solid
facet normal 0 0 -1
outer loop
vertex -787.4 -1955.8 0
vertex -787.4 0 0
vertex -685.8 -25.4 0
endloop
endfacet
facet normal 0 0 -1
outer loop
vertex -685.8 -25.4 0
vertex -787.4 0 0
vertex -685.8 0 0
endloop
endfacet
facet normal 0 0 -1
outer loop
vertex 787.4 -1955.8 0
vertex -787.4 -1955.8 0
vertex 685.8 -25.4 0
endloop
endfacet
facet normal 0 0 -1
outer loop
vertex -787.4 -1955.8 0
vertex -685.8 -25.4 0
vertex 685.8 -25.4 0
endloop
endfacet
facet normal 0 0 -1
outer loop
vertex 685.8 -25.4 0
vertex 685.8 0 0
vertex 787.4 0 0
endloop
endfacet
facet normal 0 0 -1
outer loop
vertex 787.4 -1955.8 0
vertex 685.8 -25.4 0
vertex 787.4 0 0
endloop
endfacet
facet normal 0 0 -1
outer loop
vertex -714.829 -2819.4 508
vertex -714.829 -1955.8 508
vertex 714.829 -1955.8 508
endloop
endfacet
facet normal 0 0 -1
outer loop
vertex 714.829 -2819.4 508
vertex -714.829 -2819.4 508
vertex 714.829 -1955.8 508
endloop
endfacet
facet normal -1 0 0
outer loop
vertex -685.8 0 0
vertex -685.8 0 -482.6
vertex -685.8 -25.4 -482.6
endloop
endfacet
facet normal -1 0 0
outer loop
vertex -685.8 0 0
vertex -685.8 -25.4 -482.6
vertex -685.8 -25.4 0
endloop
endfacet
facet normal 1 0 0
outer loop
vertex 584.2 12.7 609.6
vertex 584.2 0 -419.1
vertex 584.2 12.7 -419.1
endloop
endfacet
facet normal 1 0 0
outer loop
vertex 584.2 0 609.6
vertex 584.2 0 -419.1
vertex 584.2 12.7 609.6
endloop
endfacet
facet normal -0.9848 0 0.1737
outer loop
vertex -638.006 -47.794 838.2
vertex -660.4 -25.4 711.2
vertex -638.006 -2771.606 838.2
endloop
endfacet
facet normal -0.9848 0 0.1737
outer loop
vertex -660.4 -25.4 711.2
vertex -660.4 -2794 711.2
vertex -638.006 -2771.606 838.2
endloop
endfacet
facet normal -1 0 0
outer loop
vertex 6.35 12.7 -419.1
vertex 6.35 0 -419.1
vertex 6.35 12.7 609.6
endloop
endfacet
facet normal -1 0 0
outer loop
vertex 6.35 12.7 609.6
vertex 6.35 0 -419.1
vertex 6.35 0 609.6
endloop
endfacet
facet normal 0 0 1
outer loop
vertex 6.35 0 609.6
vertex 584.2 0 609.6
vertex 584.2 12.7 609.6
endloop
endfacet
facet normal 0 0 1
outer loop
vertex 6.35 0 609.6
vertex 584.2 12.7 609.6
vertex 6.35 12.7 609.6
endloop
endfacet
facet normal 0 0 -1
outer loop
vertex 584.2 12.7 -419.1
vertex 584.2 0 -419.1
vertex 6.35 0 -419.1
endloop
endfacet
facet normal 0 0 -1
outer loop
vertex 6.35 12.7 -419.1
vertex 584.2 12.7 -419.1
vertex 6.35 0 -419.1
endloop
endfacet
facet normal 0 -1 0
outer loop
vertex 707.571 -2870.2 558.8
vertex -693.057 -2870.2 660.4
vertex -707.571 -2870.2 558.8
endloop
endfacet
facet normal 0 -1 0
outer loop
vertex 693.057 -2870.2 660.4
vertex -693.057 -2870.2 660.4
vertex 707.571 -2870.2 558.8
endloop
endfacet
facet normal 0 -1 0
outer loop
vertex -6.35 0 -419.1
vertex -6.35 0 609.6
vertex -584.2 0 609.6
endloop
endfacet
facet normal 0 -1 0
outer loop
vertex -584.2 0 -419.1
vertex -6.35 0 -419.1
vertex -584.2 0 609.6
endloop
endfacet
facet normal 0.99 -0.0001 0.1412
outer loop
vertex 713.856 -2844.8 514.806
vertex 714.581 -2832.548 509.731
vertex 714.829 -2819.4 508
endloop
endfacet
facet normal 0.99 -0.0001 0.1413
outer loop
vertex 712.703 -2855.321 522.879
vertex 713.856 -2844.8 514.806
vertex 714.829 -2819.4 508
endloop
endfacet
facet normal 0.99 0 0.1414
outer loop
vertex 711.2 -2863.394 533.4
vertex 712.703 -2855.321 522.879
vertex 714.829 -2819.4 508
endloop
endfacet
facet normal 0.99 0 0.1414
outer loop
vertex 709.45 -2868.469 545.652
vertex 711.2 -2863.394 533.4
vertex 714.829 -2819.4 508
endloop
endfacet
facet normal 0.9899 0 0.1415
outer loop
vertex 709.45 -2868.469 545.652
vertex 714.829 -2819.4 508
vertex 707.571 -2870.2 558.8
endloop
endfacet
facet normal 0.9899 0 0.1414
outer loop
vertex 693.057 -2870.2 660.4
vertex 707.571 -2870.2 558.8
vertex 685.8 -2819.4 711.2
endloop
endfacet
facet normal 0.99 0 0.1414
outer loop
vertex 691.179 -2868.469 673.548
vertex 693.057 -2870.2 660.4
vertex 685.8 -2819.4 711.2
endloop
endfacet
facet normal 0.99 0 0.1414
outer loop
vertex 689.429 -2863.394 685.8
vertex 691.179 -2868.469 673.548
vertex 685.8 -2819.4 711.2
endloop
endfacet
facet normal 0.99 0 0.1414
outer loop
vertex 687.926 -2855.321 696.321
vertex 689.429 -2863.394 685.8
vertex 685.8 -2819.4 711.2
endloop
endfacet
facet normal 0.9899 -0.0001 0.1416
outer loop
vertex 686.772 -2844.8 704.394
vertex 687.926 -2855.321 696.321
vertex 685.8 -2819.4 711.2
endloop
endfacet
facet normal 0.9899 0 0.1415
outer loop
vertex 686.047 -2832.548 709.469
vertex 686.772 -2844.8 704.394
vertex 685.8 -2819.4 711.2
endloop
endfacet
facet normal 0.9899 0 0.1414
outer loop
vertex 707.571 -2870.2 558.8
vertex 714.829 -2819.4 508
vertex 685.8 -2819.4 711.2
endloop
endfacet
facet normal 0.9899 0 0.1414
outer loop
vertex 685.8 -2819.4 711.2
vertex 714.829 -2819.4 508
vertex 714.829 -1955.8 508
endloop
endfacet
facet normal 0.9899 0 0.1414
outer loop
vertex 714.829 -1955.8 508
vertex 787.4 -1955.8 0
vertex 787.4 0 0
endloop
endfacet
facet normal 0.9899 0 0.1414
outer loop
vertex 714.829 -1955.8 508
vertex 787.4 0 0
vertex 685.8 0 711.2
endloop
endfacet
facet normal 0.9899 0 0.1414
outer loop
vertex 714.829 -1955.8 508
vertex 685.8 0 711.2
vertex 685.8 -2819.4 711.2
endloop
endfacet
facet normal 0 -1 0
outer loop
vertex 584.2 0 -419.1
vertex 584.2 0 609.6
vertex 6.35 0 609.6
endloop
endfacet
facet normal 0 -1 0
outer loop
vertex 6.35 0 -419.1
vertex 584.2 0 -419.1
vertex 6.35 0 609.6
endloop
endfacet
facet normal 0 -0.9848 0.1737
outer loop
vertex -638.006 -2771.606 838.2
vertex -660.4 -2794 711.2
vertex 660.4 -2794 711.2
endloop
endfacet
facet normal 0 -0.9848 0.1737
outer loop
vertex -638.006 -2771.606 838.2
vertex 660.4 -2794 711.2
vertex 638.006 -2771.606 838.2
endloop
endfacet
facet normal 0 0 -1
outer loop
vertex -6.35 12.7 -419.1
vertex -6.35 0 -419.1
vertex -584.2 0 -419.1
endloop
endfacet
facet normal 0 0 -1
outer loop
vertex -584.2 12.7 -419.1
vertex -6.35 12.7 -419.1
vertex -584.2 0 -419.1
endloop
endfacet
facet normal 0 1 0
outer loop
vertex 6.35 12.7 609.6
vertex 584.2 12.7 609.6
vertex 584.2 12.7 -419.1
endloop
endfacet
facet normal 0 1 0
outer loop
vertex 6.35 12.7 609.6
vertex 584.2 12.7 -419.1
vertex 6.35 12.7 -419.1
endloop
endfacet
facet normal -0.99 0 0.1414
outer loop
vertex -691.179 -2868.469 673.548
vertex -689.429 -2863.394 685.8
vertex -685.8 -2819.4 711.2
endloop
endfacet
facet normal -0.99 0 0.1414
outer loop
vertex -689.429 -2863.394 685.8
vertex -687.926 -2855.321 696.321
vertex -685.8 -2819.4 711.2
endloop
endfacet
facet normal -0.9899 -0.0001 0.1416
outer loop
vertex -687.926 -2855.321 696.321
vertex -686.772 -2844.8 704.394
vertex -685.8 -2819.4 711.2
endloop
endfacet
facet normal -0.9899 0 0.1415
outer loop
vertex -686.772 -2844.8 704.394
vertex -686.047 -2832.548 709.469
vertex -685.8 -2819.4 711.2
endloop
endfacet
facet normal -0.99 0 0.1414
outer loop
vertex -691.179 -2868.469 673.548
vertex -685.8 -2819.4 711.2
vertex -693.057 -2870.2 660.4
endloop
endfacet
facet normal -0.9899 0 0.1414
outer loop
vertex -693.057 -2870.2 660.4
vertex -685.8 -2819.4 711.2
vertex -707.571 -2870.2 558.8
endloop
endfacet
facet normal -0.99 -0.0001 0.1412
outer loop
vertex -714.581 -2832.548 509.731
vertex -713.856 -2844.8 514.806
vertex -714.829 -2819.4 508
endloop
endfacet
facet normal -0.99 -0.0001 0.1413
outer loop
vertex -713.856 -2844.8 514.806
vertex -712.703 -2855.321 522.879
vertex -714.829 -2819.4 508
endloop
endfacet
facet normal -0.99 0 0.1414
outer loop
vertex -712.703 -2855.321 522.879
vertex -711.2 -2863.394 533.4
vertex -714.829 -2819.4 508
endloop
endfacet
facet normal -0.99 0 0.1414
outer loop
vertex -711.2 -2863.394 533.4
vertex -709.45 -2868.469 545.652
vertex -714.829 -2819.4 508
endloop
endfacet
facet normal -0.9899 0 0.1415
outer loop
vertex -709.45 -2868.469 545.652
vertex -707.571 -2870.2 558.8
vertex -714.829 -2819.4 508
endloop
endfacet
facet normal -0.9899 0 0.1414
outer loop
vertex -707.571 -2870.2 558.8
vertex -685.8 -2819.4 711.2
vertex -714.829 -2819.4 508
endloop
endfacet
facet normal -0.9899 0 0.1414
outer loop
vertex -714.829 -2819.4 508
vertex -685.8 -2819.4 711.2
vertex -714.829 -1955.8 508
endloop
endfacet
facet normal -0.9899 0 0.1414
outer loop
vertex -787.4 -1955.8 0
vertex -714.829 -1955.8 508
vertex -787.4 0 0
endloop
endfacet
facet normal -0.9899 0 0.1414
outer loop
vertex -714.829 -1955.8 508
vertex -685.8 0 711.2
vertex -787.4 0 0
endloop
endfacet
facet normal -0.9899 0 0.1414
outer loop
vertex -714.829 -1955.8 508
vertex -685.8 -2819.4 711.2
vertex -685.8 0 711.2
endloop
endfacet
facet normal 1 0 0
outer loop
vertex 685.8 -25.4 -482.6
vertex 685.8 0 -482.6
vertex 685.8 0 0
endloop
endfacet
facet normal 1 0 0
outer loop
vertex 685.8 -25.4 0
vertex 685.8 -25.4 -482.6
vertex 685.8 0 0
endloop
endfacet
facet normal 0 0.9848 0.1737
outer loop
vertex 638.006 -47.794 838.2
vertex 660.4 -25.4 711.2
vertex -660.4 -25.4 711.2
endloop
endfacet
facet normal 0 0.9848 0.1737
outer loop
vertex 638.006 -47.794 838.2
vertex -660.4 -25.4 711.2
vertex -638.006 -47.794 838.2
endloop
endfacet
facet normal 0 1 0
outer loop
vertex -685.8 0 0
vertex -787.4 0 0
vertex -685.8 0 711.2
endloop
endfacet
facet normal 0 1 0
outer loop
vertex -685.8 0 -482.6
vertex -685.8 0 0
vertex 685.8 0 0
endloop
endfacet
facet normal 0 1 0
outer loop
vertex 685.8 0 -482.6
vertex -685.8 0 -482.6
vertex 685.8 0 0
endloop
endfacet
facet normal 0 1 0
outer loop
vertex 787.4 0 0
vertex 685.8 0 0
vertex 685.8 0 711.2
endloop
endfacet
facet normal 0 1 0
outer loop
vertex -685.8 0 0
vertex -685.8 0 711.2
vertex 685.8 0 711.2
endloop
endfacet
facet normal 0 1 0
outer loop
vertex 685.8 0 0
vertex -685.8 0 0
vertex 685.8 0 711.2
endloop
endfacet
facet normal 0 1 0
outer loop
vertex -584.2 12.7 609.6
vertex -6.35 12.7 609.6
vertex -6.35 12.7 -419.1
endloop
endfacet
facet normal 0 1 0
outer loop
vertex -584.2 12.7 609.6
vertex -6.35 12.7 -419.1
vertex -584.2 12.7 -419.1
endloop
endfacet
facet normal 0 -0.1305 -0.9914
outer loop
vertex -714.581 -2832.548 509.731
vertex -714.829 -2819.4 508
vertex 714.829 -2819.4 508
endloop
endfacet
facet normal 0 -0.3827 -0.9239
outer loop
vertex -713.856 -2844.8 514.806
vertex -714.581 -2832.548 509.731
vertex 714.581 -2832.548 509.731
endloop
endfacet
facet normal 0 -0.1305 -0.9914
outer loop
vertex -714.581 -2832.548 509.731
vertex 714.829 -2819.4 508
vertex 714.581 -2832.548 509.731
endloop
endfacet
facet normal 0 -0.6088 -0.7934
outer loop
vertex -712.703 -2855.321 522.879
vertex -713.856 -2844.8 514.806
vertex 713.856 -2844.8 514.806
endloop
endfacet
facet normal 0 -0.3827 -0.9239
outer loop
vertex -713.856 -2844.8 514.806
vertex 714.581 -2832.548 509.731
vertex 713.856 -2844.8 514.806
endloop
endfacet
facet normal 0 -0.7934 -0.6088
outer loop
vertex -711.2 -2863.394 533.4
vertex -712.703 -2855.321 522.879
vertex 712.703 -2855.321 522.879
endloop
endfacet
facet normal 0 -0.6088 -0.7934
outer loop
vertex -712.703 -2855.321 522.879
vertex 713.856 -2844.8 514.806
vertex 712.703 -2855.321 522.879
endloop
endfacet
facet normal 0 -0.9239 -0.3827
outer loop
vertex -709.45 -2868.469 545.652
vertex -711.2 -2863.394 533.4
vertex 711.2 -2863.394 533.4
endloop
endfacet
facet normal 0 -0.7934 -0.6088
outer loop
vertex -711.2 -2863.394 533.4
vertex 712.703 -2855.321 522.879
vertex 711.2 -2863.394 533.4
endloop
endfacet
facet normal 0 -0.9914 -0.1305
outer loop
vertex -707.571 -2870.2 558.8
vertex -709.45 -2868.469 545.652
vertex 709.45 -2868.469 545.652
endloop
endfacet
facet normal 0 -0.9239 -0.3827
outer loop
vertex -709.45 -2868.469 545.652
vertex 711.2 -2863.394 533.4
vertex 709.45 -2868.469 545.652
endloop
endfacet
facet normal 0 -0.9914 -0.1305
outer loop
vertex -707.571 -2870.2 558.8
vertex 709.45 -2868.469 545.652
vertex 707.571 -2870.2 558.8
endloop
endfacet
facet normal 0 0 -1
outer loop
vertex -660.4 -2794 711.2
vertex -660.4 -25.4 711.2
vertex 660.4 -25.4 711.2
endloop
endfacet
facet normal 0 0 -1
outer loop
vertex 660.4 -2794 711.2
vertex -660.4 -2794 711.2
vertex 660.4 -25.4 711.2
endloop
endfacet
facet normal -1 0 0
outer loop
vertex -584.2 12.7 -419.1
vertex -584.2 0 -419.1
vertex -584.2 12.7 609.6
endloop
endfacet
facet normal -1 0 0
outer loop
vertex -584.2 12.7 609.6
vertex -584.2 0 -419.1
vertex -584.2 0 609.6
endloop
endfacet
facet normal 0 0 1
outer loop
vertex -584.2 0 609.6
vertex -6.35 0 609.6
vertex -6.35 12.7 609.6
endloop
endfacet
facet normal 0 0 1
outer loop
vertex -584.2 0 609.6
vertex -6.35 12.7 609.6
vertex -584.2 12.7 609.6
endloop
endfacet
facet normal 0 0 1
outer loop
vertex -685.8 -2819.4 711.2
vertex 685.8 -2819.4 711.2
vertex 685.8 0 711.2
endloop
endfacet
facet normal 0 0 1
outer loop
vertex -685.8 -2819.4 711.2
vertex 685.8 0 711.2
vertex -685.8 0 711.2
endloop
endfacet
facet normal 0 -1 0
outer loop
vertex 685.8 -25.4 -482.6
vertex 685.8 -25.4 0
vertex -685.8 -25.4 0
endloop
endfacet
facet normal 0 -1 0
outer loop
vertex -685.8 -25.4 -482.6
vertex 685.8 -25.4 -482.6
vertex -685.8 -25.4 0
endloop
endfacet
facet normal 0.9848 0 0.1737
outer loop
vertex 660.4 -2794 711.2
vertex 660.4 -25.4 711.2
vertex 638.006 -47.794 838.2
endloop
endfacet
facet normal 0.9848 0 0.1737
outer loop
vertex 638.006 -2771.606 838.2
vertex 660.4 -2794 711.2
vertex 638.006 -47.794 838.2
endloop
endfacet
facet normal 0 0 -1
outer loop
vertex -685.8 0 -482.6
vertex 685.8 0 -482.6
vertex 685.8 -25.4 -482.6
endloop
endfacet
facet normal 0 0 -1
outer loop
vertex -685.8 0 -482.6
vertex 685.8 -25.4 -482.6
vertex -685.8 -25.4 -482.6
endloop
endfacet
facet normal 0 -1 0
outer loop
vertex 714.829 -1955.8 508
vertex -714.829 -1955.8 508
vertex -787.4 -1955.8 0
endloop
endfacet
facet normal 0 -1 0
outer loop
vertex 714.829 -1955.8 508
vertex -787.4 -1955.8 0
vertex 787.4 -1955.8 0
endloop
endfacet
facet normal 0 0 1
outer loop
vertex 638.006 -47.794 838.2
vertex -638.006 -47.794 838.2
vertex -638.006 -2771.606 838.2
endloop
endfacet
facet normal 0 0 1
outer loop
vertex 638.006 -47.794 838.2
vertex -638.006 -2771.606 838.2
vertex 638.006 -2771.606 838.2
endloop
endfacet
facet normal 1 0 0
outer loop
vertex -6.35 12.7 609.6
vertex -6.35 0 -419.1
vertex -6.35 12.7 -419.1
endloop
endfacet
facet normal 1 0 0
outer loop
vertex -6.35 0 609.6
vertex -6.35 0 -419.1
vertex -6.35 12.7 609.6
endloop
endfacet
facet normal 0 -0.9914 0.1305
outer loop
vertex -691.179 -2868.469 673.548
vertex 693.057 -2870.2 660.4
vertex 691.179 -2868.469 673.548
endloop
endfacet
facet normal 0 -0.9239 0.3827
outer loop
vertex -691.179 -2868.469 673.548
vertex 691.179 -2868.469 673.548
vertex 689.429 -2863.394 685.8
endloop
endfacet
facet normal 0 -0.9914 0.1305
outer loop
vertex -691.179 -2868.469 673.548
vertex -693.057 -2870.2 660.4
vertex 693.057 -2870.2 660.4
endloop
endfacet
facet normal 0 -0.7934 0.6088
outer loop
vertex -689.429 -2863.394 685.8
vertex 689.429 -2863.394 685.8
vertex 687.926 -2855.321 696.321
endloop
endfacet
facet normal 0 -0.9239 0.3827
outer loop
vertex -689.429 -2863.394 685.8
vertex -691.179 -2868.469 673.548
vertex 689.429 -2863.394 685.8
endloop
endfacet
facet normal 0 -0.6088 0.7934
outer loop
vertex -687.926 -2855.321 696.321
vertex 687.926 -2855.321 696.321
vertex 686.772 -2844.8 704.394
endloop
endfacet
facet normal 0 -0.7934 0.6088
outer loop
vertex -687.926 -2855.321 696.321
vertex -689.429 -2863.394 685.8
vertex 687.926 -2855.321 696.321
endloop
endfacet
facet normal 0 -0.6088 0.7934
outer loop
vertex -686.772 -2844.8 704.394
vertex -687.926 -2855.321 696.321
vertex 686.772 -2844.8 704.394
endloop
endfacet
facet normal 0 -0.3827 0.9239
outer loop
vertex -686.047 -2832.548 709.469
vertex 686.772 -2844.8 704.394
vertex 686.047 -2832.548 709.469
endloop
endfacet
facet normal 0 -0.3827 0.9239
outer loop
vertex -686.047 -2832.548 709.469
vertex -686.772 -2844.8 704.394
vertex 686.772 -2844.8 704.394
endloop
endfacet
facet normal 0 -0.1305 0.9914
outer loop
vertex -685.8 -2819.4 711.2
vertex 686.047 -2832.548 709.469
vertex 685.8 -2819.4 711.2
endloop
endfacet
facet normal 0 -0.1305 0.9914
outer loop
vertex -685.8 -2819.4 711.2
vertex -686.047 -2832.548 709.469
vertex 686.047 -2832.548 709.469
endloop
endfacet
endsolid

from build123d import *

# Parameters (mm, degrees)
F1_DEPTH  = 1955.8
F3_DEPTH  = 914.4
F4_R      = 50.8
F5_W      = 1320.8
F5_H      = 2768.6
F6_DEPTH  = 127
F6_TAPER  = 10
F7_W      = 1371.6
F7_H      = 482.6
F8_DEPTH  = 25.4
F9_W      = 577.85
F9_H      = 1028.7
F10_DEPTH = 12.7


with BuildPart() as f1:
    # F0 (on Front) → F1 (new body)
    with BuildSketch(Plane.XZ):
        Polygon((-787.4, 0), (0, 0), (787.4, 0), (685.8, 711.2), (0, 711.2), (-685.8, 711.2), align=None)
    extrude(amount=F1_DEPTH)

    # F2 (on face) → F3 (join)
    with BuildSketch(Plane.XZ.offset(1955.8)):
        Polygon((-685.8, 711.2), (-714.8285714286, 508), (714.8285714286, 508), (685.8, 711.2), align=None)
    extrude(amount=F3_DEPTH)

    # F4
    f4_edges = [f1.edges().sort_by_distance(p)[0] for p in [
        (0, -2870.2, 711.2),
        (0, -2870.2, 508),
    ]]
    fillet(f4_edges, radius=F4_R)

    # F7 (on face) → F8 (join)
    with BuildSketch(Plane(origin=(0, 0, 0), x_dir=(-1, 0, 0), z_dir=(0, 1, 0))):
        with Locations((0, -241.3)):
            Rectangle(F7_W, F7_H)
    extrude(amount=-F8_DEPTH)


with BuildPart() as f6:
    # F5 (on face) → F6 (new body)
    with BuildSketch(Plane.XY.offset(711.2)):
        with Locations((0, -1409.7)):
            Rectangle(F5_W, F5_H)
    extrude(amount=F6_DEPTH, taper=F6_TAPER)


with BuildPart() as f10:
    # F9 (on face) → F10 (new body)
    with BuildSketch(Plane(origin=(0, 0, 0), x_dir=(-1, 0, 0), z_dir=(0, 1, 0))):
        with Locations((-295.275, 95.25)):
            Rectangle(F9_W, F9_H)
    extrude(amount=F10_DEPTH)


with BuildPart() as f10b:
    # F9 (on face) → F10, piece 2 (new body)
    with BuildSketch(Plane(origin=(0, 0, 0), x_dir=(-1, 0, 0), z_dir=(0, 1, 0))):
        with Locations((295.275, 95.25)):
            Rectangle(F9_W, F9_H)
    extrude(amount=F10_DEPTH)


solid = Compound([f1.part, f6.part, f10.part, f10b.part])
